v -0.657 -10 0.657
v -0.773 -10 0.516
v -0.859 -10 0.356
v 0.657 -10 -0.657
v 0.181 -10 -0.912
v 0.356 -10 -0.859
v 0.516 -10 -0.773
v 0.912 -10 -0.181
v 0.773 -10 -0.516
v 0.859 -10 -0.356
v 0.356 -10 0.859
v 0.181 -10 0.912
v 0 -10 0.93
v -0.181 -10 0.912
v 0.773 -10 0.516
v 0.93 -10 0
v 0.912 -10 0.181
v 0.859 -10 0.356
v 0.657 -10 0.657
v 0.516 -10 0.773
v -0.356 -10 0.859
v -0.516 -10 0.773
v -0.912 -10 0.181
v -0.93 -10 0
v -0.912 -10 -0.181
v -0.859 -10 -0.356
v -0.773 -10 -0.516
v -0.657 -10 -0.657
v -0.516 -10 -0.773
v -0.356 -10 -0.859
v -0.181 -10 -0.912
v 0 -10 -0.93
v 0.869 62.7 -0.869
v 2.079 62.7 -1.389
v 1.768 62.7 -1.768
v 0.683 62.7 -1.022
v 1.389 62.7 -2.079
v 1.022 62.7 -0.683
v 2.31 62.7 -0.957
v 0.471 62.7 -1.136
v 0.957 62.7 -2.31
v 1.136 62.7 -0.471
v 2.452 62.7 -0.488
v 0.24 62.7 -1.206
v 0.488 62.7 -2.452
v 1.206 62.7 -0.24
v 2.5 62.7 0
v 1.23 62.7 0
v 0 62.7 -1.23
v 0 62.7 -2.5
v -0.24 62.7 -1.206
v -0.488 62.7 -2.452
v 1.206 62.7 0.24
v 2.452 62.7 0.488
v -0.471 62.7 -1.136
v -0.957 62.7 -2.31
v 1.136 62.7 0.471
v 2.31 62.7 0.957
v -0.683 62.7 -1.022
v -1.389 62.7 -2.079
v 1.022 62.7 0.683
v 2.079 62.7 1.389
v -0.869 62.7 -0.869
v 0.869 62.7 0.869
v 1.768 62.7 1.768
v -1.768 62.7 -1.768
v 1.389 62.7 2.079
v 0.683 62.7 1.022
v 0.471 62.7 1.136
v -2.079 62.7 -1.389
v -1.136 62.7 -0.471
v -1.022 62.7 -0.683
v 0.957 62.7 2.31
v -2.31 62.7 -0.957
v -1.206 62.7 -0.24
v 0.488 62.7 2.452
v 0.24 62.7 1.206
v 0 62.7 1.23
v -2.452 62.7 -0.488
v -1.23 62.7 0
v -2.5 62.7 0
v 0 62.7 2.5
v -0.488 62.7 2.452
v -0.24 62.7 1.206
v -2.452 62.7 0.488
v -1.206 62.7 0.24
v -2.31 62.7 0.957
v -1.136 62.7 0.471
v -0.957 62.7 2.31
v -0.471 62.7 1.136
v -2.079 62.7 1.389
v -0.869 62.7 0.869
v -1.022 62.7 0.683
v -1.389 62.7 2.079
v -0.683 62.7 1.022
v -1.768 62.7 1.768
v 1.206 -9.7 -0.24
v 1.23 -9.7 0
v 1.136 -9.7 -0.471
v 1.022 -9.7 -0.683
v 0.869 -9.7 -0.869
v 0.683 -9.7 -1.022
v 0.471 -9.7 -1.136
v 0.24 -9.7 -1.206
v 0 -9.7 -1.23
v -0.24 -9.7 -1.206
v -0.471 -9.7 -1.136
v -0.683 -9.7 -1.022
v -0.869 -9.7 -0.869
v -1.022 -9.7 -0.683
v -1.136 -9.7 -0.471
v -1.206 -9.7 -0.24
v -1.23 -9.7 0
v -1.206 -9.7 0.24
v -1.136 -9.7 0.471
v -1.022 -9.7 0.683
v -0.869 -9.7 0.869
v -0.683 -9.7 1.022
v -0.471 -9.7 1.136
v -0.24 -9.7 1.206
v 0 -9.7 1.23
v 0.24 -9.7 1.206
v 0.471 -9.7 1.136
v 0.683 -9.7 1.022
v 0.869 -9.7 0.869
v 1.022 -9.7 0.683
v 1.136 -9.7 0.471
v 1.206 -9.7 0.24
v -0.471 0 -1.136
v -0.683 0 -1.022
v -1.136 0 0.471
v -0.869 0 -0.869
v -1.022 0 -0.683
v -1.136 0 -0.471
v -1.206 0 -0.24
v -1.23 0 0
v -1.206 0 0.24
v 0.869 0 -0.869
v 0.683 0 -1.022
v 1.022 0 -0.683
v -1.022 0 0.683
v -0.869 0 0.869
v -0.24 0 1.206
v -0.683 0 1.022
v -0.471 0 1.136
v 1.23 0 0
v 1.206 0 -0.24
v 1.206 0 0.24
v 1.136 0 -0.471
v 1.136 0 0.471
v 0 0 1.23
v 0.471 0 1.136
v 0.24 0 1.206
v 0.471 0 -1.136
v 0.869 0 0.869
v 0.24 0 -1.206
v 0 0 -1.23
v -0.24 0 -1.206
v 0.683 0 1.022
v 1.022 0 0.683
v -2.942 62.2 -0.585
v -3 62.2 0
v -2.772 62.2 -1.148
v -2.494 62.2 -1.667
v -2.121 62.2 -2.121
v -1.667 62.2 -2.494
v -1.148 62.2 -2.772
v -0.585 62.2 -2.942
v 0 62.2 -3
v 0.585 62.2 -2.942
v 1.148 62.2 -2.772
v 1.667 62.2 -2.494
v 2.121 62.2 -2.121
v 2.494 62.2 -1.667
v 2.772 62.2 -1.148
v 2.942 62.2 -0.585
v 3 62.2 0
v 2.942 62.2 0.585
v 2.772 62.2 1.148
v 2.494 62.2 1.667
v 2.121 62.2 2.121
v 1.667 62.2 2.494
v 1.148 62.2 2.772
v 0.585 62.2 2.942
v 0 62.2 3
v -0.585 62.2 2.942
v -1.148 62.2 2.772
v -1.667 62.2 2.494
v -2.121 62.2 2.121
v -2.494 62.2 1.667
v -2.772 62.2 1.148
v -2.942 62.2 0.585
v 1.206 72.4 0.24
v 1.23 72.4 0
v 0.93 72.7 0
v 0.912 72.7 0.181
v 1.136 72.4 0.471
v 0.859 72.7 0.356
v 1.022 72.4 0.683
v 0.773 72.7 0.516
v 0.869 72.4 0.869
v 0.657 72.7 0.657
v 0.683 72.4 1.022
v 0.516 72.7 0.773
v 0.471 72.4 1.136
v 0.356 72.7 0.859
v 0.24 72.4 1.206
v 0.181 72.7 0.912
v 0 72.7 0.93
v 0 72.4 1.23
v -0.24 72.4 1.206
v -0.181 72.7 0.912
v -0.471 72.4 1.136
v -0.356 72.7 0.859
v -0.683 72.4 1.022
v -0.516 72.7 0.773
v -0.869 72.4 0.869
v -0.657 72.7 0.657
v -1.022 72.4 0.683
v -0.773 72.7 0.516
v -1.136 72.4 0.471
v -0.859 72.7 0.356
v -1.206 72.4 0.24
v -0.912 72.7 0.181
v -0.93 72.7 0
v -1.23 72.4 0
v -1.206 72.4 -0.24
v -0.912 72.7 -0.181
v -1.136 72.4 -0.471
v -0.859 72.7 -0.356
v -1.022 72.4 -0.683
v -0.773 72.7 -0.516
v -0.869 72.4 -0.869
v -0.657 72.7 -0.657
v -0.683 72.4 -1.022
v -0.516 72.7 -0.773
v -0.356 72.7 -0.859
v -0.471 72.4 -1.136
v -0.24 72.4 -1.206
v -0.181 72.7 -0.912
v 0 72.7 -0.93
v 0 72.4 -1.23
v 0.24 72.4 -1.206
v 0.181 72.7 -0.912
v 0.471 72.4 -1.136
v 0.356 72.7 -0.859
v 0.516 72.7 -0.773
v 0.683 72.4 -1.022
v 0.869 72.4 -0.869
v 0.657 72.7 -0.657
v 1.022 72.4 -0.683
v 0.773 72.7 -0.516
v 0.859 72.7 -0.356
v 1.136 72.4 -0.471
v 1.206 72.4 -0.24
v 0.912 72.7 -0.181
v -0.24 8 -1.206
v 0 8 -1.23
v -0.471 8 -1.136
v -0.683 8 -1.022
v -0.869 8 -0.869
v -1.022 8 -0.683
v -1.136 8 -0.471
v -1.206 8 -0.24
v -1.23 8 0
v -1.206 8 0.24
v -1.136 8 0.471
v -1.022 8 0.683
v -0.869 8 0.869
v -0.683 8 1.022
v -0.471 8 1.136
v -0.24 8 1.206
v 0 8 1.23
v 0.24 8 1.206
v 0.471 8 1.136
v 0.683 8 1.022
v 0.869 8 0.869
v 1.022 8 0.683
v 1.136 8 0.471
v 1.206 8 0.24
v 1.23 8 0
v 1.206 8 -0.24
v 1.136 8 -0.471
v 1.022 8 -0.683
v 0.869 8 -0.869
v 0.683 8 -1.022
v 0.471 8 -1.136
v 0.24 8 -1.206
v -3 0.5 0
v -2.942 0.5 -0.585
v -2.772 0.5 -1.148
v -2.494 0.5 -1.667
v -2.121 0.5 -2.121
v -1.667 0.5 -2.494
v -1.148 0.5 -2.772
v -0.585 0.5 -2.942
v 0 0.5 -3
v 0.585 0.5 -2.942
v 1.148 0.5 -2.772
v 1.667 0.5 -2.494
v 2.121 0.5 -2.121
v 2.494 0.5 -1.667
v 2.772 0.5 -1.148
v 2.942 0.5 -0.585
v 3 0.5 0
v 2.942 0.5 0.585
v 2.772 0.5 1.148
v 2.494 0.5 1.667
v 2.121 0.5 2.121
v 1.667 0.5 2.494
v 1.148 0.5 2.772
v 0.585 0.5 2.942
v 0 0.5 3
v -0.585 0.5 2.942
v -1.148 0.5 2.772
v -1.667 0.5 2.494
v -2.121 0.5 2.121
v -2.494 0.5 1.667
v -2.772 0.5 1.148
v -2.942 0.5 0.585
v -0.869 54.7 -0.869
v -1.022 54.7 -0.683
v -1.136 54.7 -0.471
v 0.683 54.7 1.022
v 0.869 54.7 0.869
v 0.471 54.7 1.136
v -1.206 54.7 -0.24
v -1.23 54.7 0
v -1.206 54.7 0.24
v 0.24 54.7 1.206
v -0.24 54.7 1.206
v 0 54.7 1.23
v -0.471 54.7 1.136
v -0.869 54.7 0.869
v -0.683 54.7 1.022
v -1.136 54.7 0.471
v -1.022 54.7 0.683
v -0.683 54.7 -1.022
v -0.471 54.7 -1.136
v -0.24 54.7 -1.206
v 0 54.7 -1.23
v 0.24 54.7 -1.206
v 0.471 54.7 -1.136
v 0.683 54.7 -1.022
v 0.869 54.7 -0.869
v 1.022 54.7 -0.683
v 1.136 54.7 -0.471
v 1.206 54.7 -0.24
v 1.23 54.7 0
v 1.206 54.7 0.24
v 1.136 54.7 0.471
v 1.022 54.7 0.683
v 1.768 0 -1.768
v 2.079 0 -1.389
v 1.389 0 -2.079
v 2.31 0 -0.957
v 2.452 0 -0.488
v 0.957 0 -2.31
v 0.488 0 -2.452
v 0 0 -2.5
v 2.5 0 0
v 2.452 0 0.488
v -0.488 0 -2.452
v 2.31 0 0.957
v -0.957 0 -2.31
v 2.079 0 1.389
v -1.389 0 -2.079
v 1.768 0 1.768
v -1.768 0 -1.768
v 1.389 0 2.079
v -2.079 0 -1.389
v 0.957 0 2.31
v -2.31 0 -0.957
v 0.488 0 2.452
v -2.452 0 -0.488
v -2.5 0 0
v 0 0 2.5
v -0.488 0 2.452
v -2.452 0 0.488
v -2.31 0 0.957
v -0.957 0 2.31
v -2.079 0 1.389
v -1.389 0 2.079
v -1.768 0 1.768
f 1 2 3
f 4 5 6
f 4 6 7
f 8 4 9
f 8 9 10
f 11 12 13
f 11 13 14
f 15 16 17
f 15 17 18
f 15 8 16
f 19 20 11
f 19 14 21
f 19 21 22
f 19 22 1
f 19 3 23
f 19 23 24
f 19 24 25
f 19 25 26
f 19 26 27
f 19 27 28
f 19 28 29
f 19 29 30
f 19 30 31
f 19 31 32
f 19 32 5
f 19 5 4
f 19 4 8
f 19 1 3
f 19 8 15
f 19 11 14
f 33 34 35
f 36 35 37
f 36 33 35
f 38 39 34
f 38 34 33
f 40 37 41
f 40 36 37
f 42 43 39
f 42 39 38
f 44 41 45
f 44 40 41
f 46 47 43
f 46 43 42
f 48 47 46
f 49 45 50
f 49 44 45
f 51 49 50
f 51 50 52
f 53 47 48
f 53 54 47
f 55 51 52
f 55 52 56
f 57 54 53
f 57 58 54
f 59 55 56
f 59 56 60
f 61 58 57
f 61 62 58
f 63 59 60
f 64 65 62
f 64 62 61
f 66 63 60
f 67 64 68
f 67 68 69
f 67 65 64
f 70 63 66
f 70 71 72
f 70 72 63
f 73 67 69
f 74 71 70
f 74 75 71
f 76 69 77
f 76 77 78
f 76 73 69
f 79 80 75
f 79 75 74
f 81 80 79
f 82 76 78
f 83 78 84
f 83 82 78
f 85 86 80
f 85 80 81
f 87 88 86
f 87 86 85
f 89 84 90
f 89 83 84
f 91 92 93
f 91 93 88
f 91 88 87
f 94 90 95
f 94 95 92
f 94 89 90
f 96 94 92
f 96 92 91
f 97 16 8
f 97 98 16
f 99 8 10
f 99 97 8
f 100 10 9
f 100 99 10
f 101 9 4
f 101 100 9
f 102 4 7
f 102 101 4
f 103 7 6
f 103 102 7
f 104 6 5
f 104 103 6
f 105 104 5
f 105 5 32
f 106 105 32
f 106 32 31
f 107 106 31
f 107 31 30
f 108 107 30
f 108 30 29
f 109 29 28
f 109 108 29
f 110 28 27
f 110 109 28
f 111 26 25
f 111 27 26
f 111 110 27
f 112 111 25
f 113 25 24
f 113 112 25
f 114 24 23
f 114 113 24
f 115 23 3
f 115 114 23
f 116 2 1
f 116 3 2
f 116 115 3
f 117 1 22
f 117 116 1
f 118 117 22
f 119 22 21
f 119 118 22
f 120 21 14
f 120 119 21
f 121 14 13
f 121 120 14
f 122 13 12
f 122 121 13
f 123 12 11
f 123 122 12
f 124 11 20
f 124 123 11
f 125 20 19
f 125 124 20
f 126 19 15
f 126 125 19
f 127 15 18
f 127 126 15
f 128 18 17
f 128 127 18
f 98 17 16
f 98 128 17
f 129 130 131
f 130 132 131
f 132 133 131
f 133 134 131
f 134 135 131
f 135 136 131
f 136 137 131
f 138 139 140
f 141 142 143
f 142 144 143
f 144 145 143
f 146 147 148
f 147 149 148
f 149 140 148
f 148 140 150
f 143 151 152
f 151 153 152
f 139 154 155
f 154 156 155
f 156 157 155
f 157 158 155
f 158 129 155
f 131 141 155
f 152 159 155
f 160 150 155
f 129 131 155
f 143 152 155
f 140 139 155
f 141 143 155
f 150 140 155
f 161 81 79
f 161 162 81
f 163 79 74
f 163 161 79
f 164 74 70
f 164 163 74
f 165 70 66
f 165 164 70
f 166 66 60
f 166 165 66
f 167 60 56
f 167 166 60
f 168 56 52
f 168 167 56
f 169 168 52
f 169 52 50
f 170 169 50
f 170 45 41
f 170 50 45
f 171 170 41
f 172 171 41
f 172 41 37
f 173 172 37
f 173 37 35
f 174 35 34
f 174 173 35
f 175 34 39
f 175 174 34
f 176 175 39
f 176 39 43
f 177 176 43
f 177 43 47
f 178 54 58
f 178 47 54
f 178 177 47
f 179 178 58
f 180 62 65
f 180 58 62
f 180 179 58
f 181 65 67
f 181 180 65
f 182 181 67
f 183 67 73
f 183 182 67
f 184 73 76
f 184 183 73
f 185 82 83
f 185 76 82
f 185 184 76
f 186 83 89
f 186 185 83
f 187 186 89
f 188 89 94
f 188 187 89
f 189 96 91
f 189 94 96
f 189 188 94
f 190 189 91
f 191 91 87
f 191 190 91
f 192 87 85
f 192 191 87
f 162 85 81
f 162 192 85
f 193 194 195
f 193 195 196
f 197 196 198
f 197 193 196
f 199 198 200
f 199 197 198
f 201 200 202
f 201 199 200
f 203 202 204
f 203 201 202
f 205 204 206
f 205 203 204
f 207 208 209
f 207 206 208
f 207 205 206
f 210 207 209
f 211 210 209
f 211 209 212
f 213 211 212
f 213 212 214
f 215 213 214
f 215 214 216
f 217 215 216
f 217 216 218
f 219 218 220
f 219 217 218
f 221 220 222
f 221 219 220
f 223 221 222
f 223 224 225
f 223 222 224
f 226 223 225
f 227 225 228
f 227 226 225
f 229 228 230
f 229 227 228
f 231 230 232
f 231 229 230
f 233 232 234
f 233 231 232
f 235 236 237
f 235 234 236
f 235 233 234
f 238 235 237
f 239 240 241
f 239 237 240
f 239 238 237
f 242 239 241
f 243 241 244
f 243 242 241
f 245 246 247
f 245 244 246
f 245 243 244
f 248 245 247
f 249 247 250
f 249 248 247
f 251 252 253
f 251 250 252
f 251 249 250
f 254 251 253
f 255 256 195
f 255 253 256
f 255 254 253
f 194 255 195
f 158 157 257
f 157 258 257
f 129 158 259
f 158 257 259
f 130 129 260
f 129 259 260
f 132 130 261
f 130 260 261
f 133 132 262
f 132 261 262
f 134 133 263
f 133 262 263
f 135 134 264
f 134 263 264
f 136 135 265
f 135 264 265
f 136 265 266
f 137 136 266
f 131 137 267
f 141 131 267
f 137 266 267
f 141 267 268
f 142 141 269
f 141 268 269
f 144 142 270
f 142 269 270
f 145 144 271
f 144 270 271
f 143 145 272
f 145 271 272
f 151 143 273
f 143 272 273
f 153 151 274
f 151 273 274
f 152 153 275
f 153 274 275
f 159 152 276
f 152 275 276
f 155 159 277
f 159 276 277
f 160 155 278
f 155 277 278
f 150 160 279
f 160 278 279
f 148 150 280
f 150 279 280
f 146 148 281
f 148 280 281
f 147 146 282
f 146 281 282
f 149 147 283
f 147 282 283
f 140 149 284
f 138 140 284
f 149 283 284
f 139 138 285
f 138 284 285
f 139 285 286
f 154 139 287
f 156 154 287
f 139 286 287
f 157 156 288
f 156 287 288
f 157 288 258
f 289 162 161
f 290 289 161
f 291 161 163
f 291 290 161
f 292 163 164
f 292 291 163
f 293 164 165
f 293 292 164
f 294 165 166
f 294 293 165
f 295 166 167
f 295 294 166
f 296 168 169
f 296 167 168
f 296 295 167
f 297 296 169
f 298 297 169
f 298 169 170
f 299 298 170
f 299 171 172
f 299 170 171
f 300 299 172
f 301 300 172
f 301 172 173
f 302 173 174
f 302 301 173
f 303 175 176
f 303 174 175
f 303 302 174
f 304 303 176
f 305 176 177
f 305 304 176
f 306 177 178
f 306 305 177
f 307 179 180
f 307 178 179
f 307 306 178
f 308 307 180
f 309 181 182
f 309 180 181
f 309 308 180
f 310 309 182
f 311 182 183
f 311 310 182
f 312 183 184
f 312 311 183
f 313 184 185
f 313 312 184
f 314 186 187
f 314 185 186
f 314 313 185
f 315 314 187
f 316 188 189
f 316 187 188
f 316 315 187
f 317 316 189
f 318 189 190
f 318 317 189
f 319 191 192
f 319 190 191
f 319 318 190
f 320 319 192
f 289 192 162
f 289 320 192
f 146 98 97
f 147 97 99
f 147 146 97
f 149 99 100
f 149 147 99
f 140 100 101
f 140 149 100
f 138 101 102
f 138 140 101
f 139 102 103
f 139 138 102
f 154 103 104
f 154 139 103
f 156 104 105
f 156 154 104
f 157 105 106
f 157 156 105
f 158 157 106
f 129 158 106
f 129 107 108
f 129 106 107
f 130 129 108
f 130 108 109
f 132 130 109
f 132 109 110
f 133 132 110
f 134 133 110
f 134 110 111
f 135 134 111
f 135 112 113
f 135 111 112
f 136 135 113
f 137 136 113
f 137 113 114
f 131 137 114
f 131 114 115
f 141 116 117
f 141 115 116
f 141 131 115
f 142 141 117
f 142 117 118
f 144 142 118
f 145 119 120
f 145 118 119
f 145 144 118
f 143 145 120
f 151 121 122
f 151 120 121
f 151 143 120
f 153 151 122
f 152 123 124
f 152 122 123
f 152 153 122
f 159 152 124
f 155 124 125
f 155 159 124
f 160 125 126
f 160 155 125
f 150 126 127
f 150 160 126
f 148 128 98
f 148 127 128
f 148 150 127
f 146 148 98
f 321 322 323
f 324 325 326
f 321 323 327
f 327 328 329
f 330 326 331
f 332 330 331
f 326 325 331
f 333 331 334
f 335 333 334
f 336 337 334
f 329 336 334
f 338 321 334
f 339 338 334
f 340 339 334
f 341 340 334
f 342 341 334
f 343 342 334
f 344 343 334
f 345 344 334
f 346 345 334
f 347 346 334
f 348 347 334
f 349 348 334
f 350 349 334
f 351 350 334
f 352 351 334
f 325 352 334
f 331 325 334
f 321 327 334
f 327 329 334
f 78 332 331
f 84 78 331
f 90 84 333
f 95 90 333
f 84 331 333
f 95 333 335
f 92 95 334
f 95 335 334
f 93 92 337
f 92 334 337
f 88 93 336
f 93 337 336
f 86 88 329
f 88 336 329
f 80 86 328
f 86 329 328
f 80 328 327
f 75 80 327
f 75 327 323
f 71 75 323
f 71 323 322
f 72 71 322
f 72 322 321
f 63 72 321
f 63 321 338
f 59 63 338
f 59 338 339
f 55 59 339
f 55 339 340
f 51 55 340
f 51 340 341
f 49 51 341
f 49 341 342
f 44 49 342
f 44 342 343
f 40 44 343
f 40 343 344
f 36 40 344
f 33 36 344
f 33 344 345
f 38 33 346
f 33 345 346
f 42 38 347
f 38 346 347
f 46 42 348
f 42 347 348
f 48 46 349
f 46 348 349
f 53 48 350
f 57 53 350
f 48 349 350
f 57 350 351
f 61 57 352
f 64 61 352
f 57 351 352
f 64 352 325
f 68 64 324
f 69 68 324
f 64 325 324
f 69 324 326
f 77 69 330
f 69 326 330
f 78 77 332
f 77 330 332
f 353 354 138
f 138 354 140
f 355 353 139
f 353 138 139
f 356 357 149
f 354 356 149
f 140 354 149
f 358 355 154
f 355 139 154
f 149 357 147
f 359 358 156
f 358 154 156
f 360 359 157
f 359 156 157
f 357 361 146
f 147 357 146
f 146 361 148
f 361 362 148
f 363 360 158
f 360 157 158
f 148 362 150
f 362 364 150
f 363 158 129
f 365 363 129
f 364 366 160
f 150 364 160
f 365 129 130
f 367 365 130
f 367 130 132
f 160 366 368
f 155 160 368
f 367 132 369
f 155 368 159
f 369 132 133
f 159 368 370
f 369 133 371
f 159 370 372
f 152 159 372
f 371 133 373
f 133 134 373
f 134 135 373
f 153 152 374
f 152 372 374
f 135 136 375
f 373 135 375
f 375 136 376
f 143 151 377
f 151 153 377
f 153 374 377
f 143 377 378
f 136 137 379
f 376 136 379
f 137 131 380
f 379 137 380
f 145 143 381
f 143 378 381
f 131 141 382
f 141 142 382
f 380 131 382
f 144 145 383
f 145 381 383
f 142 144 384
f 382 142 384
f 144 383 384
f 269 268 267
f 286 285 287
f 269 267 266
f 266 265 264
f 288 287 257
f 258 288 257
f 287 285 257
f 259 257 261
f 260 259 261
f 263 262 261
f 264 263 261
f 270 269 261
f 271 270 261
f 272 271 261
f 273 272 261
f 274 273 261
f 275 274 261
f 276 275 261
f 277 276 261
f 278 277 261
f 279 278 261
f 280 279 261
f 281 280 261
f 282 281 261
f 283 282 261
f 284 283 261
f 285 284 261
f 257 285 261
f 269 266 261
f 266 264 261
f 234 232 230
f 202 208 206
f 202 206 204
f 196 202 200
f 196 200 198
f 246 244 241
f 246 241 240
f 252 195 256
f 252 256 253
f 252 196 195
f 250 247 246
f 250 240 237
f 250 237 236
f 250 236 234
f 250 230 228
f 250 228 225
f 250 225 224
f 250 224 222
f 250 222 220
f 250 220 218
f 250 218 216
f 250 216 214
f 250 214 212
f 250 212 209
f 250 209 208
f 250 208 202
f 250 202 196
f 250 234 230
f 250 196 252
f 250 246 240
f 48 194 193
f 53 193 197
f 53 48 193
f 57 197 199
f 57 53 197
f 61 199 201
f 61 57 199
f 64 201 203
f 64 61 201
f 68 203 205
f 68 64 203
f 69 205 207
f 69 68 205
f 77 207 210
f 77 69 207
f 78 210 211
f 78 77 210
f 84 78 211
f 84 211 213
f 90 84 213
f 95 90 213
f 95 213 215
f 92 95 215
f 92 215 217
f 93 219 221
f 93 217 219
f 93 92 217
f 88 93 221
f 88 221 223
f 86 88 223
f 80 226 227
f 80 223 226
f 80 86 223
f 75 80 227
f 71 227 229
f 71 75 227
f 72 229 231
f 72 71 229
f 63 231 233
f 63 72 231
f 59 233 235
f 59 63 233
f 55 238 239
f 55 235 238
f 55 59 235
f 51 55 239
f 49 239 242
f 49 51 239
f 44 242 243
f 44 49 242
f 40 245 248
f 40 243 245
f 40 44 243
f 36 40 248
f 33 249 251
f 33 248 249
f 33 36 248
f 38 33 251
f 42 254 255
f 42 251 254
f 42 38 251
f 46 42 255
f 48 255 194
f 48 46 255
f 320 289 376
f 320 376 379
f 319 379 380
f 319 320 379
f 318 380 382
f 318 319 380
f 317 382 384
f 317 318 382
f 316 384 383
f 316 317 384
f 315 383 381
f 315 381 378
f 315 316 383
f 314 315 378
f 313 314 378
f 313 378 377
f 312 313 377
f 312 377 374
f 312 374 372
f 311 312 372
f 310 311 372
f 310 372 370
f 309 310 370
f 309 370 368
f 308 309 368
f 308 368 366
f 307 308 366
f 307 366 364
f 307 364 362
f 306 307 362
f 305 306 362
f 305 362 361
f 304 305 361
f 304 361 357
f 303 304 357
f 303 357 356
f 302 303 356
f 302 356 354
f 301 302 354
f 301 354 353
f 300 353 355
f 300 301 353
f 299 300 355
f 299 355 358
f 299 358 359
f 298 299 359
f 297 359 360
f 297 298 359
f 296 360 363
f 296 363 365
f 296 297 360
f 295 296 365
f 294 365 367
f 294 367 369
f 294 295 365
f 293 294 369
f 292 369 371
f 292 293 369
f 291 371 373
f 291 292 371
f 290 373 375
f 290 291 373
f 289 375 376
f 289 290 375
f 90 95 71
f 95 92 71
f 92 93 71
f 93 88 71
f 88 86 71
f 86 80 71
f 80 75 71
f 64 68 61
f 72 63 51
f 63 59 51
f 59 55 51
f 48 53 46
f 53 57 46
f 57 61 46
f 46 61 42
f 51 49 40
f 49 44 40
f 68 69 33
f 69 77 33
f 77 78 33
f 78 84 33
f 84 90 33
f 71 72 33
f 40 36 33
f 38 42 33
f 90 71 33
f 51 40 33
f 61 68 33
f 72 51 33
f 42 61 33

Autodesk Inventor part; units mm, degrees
ref_plane "YZ Plane" through (0, 0, 0) normal (1, 0, 0) x (0, 1, 0)
ref_plane "XZ Plane" through (0, 0, 0) normal (0, 1, 0) x (-1, 0, 0)
ref_plane "XY Plane" through (0, 0, 0) normal (0, 0, 1) x (1, 0, 0)
sketch "Sketch1" plane through (0, 0, 0) normal (0, 1, 0) x (-1, 0, 0)
  circle A0 centre (0, 0) radius 3
  dimension "d0" = 6
extrude "Extrusion1" add sketch "Sketch1" along normal blind 62.7
sketch "Sketch2" plane through (0, 62.7, 0) normal (0, 1, 0) x (1, 0, 0)
  circle A0 centre (0, 0) radius 3 projected
hole "Hole1" at (0, 62.7, 0) direction (0, -1, 0) diameter 2.459 depth 8 thread size "M3x0.5" class "6H" standard "ISO Metric profile"
sketch "Sketch3" plane through (0, 0, 0) normal (0, -1, 0) x (1, 0, 0)
  circle A0 centre (0, 0) radius 3 projected
hole "Hole2" at (0, 0, 0) direction (0, 1, 0) diameter 2.459 depth 8 thread size "M3x0.5" class "6H" standard "ISO Metric profile"
chamfer "Chamfer1" distance 0.5 angle 45 2 edges at (3, 0, 0) (3, 62.7, 0)
sketch "Sketch4" plane through (0, 0, 0) normal (0, -1, 0) x (1, 0, 0)
  circle A0 centre (0, 0) radius 1.2295 projected
extrude "Extrusion2" add sketch "Sketch4" along normal blind 10
sketch "Sketch5" plane through (0, 62.7, 0) normal (0, 1, 0) x (1, 0, 0)
  circle A0 centre (0, 0) radius 1.2295 projected
extrude "Extrusion3" add sketch "Sketch5" along normal blind 10
thread "Thread1" size "M4x0.7" class "6g" standard "ANSI Metric M Profile" full length
chamfer "Chamfer2" distance 0.3 angle 45 1 edges at (-1.2295, 72.7, 0)
thread "Thread2" size "M4x0.7" class "6g" standard "ANSI Metric M Profile" full length
chamfer "Chamfer3" distance 0.3 angle 45 1 edges at (-1.2295, -10, 0)
properties part number "hridel2"
